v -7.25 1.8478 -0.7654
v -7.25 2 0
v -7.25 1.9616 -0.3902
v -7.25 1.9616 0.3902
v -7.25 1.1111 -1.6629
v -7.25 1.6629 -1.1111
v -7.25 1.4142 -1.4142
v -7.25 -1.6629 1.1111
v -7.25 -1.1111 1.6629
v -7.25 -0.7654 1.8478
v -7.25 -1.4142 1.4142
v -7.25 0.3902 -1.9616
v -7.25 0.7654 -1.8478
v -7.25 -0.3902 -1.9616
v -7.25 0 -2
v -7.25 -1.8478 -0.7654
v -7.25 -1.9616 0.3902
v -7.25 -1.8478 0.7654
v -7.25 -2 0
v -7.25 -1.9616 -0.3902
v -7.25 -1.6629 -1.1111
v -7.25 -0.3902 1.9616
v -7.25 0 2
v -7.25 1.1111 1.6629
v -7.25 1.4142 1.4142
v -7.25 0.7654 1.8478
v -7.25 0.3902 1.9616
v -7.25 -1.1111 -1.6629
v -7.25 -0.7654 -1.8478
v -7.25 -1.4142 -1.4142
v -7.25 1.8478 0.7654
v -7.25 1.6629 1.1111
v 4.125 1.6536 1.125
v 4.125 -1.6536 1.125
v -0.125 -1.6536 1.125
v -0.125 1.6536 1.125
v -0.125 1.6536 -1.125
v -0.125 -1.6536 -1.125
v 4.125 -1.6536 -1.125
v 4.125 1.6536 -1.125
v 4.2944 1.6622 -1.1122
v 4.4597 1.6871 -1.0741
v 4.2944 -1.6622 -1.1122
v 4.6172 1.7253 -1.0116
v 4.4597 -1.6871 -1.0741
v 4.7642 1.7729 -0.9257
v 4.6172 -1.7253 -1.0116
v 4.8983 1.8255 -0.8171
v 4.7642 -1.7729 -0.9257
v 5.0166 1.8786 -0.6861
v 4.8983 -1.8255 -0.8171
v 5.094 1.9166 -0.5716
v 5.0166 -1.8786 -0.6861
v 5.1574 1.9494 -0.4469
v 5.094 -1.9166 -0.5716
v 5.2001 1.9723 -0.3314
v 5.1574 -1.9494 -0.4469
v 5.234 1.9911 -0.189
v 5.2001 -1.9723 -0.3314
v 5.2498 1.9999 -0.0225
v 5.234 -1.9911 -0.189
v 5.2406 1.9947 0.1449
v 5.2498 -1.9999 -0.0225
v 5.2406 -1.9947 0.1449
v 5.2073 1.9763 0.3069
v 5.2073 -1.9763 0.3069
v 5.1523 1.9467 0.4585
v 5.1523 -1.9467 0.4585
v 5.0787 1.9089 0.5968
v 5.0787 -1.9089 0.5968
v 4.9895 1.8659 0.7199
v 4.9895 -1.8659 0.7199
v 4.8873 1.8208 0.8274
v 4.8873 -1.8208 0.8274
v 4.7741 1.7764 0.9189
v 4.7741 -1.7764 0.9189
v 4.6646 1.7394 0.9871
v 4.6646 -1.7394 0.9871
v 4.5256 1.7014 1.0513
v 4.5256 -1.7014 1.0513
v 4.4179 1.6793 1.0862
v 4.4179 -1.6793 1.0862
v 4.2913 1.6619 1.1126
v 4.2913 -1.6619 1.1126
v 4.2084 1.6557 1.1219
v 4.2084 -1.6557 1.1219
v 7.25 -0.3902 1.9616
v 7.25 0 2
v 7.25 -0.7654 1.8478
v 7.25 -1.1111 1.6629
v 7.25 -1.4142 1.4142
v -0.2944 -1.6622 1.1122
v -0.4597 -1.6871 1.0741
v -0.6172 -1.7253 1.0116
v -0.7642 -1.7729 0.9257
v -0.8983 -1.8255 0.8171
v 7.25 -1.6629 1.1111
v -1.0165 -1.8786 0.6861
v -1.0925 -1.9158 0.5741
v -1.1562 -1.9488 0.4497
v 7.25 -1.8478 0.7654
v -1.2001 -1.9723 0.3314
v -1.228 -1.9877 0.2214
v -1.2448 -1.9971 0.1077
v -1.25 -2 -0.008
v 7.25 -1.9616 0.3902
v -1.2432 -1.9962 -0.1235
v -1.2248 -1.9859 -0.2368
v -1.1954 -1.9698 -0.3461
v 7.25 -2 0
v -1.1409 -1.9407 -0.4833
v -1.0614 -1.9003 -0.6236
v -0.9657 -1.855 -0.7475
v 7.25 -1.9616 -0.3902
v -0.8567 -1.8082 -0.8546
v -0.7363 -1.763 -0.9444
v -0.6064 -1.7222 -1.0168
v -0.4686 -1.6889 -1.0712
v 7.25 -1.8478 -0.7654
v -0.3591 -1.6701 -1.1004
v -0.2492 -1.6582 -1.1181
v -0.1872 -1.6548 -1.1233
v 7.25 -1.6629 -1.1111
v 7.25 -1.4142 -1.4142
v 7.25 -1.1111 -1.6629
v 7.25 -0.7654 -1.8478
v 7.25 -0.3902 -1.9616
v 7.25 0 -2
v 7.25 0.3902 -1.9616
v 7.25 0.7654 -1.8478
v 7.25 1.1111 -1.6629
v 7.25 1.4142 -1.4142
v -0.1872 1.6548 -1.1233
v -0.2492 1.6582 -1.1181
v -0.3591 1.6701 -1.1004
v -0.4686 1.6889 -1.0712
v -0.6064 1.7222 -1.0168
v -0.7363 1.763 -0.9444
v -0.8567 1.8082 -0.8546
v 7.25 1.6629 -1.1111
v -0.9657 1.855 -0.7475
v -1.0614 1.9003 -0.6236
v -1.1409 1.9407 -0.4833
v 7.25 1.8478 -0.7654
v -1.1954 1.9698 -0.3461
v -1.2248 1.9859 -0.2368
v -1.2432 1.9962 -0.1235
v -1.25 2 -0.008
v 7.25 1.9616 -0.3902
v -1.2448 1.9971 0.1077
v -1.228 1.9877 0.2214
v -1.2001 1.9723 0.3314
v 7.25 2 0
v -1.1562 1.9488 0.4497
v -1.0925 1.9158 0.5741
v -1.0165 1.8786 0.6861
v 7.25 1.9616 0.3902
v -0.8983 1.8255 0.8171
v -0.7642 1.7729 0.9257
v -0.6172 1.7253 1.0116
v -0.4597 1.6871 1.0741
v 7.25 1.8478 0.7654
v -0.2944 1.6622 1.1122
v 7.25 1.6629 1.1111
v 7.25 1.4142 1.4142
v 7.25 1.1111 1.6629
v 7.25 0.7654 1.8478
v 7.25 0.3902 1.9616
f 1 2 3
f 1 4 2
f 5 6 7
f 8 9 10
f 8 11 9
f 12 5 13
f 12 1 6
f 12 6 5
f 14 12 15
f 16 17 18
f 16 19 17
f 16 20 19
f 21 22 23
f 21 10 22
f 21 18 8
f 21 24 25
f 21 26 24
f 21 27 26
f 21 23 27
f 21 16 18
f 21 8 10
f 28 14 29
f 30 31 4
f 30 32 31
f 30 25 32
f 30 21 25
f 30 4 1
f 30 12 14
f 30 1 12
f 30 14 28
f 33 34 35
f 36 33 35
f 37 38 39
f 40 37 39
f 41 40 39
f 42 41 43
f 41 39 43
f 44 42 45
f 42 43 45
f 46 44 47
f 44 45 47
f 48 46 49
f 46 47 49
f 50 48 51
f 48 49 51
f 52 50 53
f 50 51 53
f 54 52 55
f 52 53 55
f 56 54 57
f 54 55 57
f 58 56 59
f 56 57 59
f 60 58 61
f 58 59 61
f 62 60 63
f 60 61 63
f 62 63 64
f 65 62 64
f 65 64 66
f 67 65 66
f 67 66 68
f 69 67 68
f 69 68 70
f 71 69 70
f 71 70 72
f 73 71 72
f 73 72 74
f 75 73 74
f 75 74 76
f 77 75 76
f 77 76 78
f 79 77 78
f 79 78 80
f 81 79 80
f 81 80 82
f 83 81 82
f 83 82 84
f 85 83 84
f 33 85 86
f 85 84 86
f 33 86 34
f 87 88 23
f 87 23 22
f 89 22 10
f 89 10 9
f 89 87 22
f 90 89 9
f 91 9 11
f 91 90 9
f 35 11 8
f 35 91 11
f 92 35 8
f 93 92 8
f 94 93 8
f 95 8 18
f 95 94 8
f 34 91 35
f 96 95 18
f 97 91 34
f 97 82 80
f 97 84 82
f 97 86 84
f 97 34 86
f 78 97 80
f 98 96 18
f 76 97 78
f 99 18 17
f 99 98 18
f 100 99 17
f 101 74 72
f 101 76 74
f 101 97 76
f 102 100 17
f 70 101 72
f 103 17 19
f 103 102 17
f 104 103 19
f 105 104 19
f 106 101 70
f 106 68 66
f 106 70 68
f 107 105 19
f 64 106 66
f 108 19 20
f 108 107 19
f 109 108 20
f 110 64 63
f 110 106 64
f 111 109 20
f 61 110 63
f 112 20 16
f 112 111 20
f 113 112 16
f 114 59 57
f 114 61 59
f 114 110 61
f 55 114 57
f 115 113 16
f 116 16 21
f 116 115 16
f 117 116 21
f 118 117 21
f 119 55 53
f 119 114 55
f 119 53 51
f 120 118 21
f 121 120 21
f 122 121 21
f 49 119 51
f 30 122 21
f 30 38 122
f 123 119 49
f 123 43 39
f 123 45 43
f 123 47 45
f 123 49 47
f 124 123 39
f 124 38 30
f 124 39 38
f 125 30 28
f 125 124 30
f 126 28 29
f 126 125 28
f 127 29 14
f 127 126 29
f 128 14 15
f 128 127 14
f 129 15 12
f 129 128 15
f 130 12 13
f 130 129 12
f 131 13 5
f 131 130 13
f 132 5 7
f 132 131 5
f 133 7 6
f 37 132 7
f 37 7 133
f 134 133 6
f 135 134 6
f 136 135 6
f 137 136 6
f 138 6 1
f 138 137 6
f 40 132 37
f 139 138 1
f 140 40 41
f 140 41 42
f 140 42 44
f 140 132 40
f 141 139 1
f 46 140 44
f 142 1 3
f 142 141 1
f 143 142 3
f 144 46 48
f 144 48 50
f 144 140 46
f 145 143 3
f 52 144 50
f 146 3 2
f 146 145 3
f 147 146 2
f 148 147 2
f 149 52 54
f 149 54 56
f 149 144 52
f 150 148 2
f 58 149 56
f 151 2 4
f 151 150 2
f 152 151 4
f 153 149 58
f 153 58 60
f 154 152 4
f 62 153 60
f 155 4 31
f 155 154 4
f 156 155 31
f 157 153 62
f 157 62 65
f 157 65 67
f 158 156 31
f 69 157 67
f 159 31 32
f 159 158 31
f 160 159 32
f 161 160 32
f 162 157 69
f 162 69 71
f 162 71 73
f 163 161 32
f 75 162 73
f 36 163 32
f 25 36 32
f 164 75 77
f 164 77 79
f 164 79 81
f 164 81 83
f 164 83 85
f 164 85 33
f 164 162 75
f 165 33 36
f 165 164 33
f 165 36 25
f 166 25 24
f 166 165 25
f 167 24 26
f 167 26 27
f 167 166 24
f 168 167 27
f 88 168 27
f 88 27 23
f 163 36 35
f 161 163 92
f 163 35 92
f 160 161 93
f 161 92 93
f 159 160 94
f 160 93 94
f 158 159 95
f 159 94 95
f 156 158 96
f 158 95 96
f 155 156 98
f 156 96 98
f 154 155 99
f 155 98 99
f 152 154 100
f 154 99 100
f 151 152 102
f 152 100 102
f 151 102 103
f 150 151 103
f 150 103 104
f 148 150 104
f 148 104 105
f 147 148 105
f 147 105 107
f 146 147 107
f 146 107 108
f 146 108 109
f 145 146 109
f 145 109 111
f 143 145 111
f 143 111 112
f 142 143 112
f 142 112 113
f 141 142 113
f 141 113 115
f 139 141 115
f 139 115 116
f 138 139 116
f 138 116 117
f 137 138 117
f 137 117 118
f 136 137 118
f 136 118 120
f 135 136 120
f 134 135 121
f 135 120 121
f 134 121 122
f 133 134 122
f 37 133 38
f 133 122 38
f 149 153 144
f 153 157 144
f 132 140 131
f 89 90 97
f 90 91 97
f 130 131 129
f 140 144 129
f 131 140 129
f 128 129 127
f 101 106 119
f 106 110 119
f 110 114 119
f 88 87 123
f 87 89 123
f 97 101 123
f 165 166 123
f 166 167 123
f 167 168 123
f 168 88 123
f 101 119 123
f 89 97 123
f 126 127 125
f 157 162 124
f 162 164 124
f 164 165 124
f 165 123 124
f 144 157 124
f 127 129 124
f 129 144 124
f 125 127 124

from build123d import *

# Parameters (mm, degrees)
SKETCH1_W               = 14.5
SKETCH1_H               = 2
CUT_EXTRUDE1_DEPTH      = 8.782191208
CUT_EXTRUDE1_DEPTH_BACK = 8.782191208


with BuildPart() as part:
    # Sketch1 → Revolve1 (revolve)
    with BuildSketch(Plane(origin=(0, 0, 0), x_dir=(1, 0, 0), z_dir=(0, 1, 0)), mode=Mode.PRIVATE) as revolve1_sk:
        with Locations((0, 1)):
            Rectangle(SKETCH1_W, SKETCH1_H)
    revolve(revolve1_sk.sketch.rotate(Axis((-7.25, 0, 0), (1, 0, 0)), 180), axis=Axis((-7.25, 0, 0), (1, 0, 0)))

    # Sketch2 → Cut-Extrude1 (cut, two sides: drawn at the far end of the back side and taken through both)
    with BuildSketch(Plane(origin=(0, 0, 0), x_dir=(1, 0, 0), z_dir=(0, 1, 0)).offset(-CUT_EXTRUDE1_DEPTH_BACK)):
        with BuildLine():
            Line((-0.125, 1.125), (4.125, 1.125))
            ThreePointArc((4.125, 1.125), (5.25, 0), (4.125, -1.125))
            Line((4.125, -1.125), (-0.125, -1.125))
            ThreePointArc((-0.125, -1.125), (-1.25, 0), (-0.125, 1.125))
        make_face()
    extrude(amount=CUT_EXTRUDE1_DEPTH + CUT_EXTRUDE1_DEPTH_BACK, mode=Mode.SUBTRACT)


solid = part.part
